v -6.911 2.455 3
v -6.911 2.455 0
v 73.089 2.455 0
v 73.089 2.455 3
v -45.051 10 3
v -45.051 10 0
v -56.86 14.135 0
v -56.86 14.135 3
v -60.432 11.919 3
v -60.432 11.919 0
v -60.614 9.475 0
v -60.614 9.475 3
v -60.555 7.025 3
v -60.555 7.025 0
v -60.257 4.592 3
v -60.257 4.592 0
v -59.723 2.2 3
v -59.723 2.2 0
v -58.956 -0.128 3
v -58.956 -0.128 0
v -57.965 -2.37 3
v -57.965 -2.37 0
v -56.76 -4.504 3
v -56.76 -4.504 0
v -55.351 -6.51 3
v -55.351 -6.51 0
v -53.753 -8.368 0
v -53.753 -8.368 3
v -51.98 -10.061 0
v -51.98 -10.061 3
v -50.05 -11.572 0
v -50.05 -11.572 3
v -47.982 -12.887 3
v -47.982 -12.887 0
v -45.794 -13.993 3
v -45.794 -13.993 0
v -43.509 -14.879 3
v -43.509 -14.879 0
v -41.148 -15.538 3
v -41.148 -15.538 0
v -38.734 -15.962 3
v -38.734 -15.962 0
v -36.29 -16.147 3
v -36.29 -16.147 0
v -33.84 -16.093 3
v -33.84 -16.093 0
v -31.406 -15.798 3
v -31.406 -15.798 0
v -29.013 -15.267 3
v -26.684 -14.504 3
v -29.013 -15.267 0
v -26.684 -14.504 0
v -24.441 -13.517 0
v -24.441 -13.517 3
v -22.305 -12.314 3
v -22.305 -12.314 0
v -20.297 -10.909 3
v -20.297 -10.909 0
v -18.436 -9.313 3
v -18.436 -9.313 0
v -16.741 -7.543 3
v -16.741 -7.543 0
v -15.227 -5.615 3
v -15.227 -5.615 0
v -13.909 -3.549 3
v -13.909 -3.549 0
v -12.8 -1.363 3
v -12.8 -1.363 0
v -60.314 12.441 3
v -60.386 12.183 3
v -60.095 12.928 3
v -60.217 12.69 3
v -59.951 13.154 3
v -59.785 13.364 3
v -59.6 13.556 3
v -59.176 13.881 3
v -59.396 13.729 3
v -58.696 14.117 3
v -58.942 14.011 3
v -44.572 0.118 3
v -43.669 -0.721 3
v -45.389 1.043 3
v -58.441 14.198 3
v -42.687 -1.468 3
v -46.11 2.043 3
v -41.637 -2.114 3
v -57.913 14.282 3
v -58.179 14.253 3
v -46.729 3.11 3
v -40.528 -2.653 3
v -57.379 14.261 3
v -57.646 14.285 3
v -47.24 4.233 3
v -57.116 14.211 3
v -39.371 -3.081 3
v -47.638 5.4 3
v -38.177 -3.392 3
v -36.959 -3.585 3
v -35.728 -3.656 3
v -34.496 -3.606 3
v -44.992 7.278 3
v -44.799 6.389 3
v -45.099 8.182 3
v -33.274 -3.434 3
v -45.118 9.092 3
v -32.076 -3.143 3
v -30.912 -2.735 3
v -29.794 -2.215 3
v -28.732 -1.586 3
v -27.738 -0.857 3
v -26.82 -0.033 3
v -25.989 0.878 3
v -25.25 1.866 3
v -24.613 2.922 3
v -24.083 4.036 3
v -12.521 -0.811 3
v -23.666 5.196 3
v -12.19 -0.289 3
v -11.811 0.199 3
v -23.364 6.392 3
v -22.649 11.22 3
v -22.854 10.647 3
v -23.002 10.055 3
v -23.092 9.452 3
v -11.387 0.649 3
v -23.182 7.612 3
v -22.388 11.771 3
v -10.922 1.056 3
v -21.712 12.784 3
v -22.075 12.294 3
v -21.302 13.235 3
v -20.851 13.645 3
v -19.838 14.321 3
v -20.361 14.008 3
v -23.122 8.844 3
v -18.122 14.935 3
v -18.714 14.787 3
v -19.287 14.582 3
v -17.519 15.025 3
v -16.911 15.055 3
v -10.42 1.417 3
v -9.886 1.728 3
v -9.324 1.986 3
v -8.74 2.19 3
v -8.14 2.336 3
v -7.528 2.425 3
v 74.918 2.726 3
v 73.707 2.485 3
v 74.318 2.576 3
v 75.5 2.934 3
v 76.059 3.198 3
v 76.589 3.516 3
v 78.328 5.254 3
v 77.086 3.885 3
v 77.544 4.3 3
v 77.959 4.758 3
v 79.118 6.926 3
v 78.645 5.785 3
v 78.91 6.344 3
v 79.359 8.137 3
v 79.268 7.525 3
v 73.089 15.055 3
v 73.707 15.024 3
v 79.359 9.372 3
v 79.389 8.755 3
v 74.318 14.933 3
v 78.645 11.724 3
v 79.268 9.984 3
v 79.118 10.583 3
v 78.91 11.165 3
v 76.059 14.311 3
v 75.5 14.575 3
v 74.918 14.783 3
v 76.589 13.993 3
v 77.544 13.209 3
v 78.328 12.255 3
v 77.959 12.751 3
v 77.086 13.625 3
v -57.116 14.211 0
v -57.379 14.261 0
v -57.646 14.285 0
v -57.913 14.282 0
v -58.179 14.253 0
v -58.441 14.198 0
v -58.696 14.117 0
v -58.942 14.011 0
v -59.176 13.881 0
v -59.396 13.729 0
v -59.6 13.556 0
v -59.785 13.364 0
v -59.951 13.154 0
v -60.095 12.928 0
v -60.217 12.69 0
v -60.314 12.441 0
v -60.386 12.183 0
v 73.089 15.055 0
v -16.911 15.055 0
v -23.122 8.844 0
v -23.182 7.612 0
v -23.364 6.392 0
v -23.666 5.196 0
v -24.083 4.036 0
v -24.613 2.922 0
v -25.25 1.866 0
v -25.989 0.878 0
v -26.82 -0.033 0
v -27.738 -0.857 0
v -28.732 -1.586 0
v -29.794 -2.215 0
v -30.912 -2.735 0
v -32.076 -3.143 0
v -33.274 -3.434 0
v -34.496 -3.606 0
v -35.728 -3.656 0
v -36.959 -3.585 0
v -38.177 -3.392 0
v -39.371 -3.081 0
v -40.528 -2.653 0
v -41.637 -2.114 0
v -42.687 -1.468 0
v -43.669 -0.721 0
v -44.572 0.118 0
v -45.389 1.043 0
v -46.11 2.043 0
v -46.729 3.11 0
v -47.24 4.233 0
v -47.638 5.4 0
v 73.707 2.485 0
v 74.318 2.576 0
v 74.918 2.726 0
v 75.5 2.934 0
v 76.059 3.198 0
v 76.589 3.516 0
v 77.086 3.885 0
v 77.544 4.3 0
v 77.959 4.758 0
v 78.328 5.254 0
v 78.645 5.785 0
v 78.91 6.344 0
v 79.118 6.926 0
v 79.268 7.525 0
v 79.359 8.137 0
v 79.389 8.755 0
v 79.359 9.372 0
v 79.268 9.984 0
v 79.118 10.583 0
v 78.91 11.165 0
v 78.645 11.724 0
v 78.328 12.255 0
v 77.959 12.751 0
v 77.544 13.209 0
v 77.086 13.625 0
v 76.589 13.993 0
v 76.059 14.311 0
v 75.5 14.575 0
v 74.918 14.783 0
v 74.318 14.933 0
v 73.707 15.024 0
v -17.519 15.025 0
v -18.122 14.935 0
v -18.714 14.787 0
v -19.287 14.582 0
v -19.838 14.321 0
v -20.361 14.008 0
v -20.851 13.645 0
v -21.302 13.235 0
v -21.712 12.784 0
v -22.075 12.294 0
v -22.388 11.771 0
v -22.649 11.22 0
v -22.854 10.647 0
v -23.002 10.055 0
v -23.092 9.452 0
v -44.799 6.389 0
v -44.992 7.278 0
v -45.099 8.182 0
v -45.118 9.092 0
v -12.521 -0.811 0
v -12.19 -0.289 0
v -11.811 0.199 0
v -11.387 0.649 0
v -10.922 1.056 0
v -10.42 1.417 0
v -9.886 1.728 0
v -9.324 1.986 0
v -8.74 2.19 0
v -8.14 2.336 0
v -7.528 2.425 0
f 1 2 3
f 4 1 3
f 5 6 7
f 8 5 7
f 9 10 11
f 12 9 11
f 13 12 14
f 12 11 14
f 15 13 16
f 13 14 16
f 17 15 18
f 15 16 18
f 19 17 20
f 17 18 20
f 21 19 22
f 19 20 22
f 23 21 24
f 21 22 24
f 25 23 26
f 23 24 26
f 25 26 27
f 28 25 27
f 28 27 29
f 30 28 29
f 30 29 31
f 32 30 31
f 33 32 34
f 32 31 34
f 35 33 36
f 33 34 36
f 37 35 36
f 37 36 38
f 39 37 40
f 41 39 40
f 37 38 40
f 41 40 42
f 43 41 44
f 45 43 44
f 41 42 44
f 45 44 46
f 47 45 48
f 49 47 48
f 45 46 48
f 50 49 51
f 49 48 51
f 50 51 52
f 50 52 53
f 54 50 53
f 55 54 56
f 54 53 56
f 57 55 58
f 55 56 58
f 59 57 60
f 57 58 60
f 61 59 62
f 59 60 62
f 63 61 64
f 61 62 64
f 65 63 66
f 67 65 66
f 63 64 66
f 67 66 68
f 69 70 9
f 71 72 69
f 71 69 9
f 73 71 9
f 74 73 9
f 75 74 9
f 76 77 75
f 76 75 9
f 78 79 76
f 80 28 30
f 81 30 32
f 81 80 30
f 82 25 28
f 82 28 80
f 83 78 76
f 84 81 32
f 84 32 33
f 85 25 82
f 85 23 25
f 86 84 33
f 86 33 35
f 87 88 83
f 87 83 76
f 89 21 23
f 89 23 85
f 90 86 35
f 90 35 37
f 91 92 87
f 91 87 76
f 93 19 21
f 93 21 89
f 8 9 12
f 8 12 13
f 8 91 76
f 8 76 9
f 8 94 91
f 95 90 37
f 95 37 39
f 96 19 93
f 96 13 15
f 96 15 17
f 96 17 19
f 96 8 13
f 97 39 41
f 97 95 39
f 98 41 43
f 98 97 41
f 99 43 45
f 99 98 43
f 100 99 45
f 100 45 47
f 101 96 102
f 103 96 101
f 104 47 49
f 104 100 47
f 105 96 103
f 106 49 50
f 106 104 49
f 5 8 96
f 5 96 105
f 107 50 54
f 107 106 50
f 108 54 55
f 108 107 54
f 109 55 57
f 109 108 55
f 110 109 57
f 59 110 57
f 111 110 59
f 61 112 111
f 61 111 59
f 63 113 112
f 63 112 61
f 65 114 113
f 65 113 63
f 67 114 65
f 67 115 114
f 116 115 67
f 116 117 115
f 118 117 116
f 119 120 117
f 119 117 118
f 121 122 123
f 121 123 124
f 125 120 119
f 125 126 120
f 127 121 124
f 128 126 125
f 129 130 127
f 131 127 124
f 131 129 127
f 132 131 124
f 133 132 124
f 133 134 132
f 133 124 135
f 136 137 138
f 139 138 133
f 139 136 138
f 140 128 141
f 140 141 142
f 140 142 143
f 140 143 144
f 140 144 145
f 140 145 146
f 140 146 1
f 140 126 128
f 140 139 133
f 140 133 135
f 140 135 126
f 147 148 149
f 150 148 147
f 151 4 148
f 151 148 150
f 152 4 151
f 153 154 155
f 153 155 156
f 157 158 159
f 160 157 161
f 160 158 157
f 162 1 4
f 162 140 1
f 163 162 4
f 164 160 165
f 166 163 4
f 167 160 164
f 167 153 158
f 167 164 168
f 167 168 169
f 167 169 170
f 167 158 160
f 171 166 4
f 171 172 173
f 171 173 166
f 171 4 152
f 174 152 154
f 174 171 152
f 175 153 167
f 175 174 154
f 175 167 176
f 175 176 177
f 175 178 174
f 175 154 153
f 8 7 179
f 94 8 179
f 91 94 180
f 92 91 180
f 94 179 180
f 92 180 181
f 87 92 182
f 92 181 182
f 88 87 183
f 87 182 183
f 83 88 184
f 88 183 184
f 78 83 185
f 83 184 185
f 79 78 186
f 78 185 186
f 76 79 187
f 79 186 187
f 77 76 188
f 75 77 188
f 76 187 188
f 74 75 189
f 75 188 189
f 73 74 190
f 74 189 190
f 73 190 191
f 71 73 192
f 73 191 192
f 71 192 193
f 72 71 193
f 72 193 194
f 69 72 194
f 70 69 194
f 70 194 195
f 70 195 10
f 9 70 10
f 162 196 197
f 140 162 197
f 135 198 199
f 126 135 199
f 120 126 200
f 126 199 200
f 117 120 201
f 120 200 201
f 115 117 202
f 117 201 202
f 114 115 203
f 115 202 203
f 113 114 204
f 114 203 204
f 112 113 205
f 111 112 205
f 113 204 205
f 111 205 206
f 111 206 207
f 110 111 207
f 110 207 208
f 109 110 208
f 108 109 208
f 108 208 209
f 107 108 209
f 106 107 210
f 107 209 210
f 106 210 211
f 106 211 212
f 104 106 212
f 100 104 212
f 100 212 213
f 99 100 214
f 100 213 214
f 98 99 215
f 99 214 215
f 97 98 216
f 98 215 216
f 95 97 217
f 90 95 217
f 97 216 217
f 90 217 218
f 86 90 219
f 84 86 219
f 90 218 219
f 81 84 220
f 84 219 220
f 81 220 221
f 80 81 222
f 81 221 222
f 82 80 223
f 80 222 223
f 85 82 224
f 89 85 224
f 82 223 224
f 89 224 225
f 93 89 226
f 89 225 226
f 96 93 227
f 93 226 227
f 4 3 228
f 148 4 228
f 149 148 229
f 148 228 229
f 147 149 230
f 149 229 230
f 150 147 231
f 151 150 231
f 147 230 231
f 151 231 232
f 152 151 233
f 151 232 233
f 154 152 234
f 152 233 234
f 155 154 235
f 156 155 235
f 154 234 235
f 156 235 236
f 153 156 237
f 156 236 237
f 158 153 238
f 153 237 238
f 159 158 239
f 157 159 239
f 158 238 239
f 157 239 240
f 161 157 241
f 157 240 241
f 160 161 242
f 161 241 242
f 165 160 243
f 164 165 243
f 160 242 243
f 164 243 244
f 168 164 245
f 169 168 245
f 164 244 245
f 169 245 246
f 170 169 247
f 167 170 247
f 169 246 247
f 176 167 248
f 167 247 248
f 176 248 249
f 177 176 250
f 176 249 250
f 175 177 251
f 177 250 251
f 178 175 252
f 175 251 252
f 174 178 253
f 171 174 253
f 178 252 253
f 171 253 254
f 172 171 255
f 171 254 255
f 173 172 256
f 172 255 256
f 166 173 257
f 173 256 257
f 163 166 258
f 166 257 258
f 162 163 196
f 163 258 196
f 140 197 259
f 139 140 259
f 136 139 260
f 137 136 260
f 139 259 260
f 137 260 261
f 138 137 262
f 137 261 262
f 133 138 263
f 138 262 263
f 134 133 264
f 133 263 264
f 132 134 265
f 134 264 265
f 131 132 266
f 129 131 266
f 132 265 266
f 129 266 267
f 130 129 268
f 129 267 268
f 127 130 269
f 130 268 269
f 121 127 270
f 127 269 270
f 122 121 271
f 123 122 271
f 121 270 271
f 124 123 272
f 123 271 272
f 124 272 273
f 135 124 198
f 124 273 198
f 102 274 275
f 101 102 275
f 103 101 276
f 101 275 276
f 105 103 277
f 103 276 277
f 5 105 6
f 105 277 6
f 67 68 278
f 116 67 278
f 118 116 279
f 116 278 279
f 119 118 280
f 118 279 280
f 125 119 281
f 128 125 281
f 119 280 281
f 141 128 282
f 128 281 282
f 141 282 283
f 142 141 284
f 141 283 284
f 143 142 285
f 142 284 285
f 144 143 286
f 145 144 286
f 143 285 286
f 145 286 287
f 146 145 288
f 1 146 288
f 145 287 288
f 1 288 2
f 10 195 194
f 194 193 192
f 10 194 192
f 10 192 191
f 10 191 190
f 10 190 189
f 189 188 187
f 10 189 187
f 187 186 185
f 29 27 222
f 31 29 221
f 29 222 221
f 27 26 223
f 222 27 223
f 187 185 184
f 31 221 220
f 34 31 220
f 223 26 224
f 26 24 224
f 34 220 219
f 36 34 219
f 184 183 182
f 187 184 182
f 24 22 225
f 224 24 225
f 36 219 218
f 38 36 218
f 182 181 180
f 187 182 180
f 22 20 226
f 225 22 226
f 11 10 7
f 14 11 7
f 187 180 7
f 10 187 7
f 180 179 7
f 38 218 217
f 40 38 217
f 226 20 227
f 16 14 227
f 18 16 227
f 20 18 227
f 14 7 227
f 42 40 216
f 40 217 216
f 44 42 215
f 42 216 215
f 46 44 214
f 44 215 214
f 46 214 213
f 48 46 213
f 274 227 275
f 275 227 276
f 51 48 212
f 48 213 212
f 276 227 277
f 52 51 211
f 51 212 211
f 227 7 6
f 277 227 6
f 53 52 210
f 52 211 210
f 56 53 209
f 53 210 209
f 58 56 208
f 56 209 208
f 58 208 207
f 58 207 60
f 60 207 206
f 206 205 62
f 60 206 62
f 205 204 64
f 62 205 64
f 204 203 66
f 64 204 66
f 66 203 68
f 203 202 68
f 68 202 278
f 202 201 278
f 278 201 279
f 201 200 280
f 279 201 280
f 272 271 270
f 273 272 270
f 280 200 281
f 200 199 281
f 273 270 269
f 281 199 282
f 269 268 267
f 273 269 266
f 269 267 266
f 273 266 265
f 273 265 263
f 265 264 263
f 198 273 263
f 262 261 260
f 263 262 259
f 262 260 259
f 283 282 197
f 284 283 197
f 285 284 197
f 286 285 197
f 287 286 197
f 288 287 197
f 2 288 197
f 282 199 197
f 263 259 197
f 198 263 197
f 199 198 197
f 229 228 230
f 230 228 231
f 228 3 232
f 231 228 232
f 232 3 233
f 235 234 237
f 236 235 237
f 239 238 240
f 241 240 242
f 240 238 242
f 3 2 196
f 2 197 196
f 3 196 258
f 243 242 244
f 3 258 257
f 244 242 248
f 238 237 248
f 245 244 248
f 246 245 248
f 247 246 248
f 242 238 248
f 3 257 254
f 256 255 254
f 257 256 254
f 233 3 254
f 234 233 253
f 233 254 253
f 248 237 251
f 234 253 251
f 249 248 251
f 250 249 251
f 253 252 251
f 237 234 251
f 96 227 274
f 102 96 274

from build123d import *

# Parameters (mm, degrees)
F2_DEPTH = 3


with BuildPart() as f2:
    # F1 (on Top) → F2 (new body)
    with BuildSketch(Plane.XY):
        with BuildLine():
            ThreePointArc((-12.8, -1.363012), (-10.41988, 1.416668), (-6.91069, 2.454538))
            Line((-6.91069, 2.454538), (73.08931, 2.454538))
            ThreePointArc((73.08931, 2.454538), (79.38931, 8.754538), (73.08931, 15.054538))
            Line((73.08931, 15.054538), (-16.91069, 15.054538))
            ThreePointArc((-16.91069, 15.054538), (-21.302441, 13.235416), (-23.121563, 8.843666))
            ThreePointArc((-23.121563, 8.843666), (-33.882827, -3.534816), (-47.637851, 5.4))
            Line((-47.637851, 5.4), (-44.798864, 6.38864))
            ThreePointArc((-44.798864, 6.38864), (-45.098507, 8.182202), (-45.050926, 10))
            Line((-45.050926, 10), (-56.859772, 14.135399))
            ThreePointArc((-56.859772, 14.135399), (-59.175607, 13.881434), (-60.43165, 11.919306))
            ThreePointArc((-60.43165, 11.919306), (-42.336736, -15.237581), (-12.8, -1.363012))
        make_face()
    extrude(amount=F2_DEPTH)


solid = f2.part
